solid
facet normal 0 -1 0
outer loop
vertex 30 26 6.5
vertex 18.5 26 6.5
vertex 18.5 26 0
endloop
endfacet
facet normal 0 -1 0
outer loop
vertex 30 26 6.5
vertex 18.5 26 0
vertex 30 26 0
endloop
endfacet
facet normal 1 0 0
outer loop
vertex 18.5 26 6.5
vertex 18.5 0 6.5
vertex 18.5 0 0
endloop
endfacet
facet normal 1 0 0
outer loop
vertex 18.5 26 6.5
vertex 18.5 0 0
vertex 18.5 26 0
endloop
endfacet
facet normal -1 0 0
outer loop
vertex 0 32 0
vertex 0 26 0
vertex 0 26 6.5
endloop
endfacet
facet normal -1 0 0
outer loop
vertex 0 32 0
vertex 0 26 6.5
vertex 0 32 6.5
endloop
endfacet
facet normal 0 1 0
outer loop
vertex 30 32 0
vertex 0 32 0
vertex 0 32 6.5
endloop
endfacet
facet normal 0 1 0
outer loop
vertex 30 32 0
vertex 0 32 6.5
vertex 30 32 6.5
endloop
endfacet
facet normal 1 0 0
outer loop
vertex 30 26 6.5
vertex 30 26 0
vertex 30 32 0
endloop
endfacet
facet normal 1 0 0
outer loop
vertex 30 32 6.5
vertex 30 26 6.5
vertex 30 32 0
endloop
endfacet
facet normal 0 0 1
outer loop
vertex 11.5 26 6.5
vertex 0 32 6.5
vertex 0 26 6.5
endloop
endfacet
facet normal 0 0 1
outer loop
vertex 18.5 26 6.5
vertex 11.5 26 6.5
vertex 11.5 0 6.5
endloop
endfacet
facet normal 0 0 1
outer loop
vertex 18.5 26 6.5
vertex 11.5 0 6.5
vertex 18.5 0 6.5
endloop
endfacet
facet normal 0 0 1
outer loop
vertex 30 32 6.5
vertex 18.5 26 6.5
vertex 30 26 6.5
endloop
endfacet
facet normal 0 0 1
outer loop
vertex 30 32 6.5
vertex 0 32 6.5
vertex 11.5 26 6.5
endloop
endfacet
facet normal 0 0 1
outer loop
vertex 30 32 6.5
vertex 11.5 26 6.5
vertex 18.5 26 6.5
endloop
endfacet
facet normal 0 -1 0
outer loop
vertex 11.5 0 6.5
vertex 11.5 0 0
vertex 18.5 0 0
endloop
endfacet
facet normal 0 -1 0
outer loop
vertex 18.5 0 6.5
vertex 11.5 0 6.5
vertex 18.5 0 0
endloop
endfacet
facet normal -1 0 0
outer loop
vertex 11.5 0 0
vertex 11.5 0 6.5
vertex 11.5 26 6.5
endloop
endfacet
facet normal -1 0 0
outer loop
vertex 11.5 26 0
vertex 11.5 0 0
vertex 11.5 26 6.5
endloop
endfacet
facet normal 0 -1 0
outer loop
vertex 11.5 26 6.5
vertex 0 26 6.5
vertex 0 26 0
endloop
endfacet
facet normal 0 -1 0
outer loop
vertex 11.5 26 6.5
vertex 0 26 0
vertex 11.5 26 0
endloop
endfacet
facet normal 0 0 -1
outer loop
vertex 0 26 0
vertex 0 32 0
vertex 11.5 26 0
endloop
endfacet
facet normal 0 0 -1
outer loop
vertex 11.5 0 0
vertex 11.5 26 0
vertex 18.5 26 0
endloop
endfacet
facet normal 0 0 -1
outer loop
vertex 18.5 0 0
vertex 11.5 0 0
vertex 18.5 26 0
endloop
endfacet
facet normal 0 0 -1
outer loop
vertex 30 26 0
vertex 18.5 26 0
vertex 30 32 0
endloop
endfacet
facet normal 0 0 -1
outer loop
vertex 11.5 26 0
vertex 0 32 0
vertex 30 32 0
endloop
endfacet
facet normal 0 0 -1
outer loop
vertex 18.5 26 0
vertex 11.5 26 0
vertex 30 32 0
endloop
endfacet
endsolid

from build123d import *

# Parameters (mm, degrees)
SKETCH1_W           = 30
SKETCH1_H           = 32
BOSS_EXTRUDE1_DEPTH = 6.5
CUT_EXTRUDE1_REACH  = 46.342
SKETCH2_W           = 11.5
SKETCH2_H           = 26


with BuildPart() as part:
    # Sketch1 → Boss-Extrude1 (new body)
    with BuildSketch(Plane.XY):
        with Locations((15, 16)):
            Rectangle(SKETCH1_W, SKETCH1_H)
    extrude(amount=BOSS_EXTRUDE1_DEPTH)

    # Sketch2 → Cut-Extrude1 (cut, up to next)
    with BuildSketch(Plane.XY.offset(6.5), mode=Mode.PRIVATE) as cut_extrude1_sk1:
        with Locations((5.75, 13)):
            Rectangle(SKETCH2_W, SKETCH2_H)
    cut_extrude1_tool1 = extrude(cut_extrude1_sk1.sketch, amount=-CUT_EXTRUDE1_REACH, mode=Mode.PRIVATE) & part.part
    # Sketch2 → Cut-Extrude1 (cut, up to next)
    with BuildSketch(Plane.XY.offset(6.5), mode=Mode.PRIVATE) as cut_extrude1_sk2:
        with Locations((24.25, 13)):
            Rectangle(SKETCH2_W, SKETCH2_H)
    cut_extrude1_tool2 = extrude(cut_extrude1_sk2.sketch, amount=-CUT_EXTRUDE1_REACH, mode=Mode.PRIVATE) & part.part
    add(cut_extrude1_tool1.solids().sort_by_distance((5.75, 13, 6.5))[0], mode=Mode.SUBTRACT)
    add(cut_extrude1_tool2.solids().sort_by_distance((24.25, 13, 6.5))[0], mode=Mode.SUBTRACT)


solid = part.part
